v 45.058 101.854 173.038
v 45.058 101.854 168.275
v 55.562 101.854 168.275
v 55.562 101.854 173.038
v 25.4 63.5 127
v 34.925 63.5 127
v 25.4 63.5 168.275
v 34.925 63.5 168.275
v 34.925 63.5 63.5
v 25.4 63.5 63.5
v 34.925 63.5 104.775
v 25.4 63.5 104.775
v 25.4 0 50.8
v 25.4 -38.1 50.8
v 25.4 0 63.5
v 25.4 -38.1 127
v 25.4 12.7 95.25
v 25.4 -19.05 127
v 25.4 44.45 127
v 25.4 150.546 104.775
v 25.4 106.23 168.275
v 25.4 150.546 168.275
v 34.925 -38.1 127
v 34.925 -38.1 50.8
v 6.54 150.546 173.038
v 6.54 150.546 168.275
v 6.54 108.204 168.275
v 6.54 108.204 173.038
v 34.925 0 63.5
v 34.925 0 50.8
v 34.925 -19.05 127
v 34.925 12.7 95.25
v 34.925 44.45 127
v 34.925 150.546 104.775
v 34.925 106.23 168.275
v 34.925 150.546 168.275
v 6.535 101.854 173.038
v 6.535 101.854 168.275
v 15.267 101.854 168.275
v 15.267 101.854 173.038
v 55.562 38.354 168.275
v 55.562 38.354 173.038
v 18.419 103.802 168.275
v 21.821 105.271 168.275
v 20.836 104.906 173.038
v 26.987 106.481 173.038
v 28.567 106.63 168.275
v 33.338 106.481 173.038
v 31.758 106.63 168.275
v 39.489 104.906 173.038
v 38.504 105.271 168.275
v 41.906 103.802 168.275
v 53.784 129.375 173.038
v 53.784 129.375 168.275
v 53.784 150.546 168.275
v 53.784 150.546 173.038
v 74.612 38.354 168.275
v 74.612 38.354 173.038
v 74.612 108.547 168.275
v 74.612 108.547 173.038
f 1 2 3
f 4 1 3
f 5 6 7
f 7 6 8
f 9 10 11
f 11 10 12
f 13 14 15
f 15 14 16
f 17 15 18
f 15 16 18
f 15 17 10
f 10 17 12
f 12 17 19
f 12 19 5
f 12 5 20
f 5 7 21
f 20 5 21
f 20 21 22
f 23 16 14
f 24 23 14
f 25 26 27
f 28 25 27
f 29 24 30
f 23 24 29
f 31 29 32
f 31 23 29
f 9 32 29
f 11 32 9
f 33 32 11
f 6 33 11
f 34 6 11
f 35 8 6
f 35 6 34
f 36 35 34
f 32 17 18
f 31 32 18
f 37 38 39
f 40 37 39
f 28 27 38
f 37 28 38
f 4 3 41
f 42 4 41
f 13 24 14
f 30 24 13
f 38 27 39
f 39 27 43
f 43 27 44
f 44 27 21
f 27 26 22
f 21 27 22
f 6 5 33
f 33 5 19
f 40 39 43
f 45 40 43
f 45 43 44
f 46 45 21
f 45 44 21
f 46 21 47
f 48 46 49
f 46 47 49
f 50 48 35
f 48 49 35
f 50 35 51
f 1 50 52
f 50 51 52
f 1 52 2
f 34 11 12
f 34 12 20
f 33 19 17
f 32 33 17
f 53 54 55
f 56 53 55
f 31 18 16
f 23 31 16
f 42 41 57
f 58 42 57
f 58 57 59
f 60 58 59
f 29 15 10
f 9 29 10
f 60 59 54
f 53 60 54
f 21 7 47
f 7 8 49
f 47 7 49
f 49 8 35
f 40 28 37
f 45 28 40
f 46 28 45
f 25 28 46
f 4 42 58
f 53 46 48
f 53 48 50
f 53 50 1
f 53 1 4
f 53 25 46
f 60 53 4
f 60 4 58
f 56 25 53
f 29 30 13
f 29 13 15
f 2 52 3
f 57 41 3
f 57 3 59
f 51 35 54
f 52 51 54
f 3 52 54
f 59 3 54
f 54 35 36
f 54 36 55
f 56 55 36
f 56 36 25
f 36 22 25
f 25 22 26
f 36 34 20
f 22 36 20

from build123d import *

# Parameters (mm, degrees)
F1_DEPTH = 9.525
F3_W     = 87.0458
F3_H     = 63.5
F3_W_2   = 38.1
F3_H_2   = 12.7
F4_DEPTH = 9.525
F6_DEPTH = 4.7625


with BuildPart() as f1:
    # F0 (on Right) → F1 (new body)
    with BuildSketch(Plane.YZ):
        Polygon((-127, 63.5), (-25.4, 63.5), (-25.4, 127), (-44.45, 127), (-76.2, 95.25), (-107.95, 127), (-127, 127), align=None)
    extrude(amount=F1_DEPTH)


with BuildPart() as f1_1:
    # F2: moved
    add(f1.part.moved(Location((25.4, 88.9, 0))))

    # F3 (on face) → F4 (join)
    with BuildSketch(Plane.YZ.offset(34.925)):
        with Locations((107.0229, 136.525)):
            Rectangle(F3_W, F3_H)
        with Locations((-19.05, 57.15)):
            Rectangle(F3_W_2, F3_H_2)
    extrude(amount=-F4_DEPTH)

    # F5 (on face) → F6 (join)
    with BuildSketch(Plane.XY.offset(168.275)):
        Polygon((6.5405, 150.5458), (6.5405, 108.204), (53.7845, 108.204), (53.7845, 129.3749), (53.7845, 150.5458), align=None)
        with BuildLine():
            Line((53.7845, 108.204), (6.5405, 108.204))
            Line((6.5405, 108.204), (6.534646, 101.854003))
            Line((6.534646, 101.854003), (15.267185, 101.854003))
            ThreePointArc((15.267185, 101.854003), (30.1625, 106.68), (45.057815, 101.854003))
            Line((45.057815, 101.854003), (55.5625, 101.854003))
            Line((55.5625, 101.854003), (55.5625, 38.354))
            Line((55.5625, 38.354), (74.6125, 38.354))
            Line((74.6125, 38.354), (74.6125, 108.5469))
            Line((74.6125, 108.5469), (53.7845, 129.3749))
            Line((53.7845, 129.3749), (53.7845, 108.204))
        make_face()
    extrude(amount=F6_DEPTH)


solid = f1_1.part
